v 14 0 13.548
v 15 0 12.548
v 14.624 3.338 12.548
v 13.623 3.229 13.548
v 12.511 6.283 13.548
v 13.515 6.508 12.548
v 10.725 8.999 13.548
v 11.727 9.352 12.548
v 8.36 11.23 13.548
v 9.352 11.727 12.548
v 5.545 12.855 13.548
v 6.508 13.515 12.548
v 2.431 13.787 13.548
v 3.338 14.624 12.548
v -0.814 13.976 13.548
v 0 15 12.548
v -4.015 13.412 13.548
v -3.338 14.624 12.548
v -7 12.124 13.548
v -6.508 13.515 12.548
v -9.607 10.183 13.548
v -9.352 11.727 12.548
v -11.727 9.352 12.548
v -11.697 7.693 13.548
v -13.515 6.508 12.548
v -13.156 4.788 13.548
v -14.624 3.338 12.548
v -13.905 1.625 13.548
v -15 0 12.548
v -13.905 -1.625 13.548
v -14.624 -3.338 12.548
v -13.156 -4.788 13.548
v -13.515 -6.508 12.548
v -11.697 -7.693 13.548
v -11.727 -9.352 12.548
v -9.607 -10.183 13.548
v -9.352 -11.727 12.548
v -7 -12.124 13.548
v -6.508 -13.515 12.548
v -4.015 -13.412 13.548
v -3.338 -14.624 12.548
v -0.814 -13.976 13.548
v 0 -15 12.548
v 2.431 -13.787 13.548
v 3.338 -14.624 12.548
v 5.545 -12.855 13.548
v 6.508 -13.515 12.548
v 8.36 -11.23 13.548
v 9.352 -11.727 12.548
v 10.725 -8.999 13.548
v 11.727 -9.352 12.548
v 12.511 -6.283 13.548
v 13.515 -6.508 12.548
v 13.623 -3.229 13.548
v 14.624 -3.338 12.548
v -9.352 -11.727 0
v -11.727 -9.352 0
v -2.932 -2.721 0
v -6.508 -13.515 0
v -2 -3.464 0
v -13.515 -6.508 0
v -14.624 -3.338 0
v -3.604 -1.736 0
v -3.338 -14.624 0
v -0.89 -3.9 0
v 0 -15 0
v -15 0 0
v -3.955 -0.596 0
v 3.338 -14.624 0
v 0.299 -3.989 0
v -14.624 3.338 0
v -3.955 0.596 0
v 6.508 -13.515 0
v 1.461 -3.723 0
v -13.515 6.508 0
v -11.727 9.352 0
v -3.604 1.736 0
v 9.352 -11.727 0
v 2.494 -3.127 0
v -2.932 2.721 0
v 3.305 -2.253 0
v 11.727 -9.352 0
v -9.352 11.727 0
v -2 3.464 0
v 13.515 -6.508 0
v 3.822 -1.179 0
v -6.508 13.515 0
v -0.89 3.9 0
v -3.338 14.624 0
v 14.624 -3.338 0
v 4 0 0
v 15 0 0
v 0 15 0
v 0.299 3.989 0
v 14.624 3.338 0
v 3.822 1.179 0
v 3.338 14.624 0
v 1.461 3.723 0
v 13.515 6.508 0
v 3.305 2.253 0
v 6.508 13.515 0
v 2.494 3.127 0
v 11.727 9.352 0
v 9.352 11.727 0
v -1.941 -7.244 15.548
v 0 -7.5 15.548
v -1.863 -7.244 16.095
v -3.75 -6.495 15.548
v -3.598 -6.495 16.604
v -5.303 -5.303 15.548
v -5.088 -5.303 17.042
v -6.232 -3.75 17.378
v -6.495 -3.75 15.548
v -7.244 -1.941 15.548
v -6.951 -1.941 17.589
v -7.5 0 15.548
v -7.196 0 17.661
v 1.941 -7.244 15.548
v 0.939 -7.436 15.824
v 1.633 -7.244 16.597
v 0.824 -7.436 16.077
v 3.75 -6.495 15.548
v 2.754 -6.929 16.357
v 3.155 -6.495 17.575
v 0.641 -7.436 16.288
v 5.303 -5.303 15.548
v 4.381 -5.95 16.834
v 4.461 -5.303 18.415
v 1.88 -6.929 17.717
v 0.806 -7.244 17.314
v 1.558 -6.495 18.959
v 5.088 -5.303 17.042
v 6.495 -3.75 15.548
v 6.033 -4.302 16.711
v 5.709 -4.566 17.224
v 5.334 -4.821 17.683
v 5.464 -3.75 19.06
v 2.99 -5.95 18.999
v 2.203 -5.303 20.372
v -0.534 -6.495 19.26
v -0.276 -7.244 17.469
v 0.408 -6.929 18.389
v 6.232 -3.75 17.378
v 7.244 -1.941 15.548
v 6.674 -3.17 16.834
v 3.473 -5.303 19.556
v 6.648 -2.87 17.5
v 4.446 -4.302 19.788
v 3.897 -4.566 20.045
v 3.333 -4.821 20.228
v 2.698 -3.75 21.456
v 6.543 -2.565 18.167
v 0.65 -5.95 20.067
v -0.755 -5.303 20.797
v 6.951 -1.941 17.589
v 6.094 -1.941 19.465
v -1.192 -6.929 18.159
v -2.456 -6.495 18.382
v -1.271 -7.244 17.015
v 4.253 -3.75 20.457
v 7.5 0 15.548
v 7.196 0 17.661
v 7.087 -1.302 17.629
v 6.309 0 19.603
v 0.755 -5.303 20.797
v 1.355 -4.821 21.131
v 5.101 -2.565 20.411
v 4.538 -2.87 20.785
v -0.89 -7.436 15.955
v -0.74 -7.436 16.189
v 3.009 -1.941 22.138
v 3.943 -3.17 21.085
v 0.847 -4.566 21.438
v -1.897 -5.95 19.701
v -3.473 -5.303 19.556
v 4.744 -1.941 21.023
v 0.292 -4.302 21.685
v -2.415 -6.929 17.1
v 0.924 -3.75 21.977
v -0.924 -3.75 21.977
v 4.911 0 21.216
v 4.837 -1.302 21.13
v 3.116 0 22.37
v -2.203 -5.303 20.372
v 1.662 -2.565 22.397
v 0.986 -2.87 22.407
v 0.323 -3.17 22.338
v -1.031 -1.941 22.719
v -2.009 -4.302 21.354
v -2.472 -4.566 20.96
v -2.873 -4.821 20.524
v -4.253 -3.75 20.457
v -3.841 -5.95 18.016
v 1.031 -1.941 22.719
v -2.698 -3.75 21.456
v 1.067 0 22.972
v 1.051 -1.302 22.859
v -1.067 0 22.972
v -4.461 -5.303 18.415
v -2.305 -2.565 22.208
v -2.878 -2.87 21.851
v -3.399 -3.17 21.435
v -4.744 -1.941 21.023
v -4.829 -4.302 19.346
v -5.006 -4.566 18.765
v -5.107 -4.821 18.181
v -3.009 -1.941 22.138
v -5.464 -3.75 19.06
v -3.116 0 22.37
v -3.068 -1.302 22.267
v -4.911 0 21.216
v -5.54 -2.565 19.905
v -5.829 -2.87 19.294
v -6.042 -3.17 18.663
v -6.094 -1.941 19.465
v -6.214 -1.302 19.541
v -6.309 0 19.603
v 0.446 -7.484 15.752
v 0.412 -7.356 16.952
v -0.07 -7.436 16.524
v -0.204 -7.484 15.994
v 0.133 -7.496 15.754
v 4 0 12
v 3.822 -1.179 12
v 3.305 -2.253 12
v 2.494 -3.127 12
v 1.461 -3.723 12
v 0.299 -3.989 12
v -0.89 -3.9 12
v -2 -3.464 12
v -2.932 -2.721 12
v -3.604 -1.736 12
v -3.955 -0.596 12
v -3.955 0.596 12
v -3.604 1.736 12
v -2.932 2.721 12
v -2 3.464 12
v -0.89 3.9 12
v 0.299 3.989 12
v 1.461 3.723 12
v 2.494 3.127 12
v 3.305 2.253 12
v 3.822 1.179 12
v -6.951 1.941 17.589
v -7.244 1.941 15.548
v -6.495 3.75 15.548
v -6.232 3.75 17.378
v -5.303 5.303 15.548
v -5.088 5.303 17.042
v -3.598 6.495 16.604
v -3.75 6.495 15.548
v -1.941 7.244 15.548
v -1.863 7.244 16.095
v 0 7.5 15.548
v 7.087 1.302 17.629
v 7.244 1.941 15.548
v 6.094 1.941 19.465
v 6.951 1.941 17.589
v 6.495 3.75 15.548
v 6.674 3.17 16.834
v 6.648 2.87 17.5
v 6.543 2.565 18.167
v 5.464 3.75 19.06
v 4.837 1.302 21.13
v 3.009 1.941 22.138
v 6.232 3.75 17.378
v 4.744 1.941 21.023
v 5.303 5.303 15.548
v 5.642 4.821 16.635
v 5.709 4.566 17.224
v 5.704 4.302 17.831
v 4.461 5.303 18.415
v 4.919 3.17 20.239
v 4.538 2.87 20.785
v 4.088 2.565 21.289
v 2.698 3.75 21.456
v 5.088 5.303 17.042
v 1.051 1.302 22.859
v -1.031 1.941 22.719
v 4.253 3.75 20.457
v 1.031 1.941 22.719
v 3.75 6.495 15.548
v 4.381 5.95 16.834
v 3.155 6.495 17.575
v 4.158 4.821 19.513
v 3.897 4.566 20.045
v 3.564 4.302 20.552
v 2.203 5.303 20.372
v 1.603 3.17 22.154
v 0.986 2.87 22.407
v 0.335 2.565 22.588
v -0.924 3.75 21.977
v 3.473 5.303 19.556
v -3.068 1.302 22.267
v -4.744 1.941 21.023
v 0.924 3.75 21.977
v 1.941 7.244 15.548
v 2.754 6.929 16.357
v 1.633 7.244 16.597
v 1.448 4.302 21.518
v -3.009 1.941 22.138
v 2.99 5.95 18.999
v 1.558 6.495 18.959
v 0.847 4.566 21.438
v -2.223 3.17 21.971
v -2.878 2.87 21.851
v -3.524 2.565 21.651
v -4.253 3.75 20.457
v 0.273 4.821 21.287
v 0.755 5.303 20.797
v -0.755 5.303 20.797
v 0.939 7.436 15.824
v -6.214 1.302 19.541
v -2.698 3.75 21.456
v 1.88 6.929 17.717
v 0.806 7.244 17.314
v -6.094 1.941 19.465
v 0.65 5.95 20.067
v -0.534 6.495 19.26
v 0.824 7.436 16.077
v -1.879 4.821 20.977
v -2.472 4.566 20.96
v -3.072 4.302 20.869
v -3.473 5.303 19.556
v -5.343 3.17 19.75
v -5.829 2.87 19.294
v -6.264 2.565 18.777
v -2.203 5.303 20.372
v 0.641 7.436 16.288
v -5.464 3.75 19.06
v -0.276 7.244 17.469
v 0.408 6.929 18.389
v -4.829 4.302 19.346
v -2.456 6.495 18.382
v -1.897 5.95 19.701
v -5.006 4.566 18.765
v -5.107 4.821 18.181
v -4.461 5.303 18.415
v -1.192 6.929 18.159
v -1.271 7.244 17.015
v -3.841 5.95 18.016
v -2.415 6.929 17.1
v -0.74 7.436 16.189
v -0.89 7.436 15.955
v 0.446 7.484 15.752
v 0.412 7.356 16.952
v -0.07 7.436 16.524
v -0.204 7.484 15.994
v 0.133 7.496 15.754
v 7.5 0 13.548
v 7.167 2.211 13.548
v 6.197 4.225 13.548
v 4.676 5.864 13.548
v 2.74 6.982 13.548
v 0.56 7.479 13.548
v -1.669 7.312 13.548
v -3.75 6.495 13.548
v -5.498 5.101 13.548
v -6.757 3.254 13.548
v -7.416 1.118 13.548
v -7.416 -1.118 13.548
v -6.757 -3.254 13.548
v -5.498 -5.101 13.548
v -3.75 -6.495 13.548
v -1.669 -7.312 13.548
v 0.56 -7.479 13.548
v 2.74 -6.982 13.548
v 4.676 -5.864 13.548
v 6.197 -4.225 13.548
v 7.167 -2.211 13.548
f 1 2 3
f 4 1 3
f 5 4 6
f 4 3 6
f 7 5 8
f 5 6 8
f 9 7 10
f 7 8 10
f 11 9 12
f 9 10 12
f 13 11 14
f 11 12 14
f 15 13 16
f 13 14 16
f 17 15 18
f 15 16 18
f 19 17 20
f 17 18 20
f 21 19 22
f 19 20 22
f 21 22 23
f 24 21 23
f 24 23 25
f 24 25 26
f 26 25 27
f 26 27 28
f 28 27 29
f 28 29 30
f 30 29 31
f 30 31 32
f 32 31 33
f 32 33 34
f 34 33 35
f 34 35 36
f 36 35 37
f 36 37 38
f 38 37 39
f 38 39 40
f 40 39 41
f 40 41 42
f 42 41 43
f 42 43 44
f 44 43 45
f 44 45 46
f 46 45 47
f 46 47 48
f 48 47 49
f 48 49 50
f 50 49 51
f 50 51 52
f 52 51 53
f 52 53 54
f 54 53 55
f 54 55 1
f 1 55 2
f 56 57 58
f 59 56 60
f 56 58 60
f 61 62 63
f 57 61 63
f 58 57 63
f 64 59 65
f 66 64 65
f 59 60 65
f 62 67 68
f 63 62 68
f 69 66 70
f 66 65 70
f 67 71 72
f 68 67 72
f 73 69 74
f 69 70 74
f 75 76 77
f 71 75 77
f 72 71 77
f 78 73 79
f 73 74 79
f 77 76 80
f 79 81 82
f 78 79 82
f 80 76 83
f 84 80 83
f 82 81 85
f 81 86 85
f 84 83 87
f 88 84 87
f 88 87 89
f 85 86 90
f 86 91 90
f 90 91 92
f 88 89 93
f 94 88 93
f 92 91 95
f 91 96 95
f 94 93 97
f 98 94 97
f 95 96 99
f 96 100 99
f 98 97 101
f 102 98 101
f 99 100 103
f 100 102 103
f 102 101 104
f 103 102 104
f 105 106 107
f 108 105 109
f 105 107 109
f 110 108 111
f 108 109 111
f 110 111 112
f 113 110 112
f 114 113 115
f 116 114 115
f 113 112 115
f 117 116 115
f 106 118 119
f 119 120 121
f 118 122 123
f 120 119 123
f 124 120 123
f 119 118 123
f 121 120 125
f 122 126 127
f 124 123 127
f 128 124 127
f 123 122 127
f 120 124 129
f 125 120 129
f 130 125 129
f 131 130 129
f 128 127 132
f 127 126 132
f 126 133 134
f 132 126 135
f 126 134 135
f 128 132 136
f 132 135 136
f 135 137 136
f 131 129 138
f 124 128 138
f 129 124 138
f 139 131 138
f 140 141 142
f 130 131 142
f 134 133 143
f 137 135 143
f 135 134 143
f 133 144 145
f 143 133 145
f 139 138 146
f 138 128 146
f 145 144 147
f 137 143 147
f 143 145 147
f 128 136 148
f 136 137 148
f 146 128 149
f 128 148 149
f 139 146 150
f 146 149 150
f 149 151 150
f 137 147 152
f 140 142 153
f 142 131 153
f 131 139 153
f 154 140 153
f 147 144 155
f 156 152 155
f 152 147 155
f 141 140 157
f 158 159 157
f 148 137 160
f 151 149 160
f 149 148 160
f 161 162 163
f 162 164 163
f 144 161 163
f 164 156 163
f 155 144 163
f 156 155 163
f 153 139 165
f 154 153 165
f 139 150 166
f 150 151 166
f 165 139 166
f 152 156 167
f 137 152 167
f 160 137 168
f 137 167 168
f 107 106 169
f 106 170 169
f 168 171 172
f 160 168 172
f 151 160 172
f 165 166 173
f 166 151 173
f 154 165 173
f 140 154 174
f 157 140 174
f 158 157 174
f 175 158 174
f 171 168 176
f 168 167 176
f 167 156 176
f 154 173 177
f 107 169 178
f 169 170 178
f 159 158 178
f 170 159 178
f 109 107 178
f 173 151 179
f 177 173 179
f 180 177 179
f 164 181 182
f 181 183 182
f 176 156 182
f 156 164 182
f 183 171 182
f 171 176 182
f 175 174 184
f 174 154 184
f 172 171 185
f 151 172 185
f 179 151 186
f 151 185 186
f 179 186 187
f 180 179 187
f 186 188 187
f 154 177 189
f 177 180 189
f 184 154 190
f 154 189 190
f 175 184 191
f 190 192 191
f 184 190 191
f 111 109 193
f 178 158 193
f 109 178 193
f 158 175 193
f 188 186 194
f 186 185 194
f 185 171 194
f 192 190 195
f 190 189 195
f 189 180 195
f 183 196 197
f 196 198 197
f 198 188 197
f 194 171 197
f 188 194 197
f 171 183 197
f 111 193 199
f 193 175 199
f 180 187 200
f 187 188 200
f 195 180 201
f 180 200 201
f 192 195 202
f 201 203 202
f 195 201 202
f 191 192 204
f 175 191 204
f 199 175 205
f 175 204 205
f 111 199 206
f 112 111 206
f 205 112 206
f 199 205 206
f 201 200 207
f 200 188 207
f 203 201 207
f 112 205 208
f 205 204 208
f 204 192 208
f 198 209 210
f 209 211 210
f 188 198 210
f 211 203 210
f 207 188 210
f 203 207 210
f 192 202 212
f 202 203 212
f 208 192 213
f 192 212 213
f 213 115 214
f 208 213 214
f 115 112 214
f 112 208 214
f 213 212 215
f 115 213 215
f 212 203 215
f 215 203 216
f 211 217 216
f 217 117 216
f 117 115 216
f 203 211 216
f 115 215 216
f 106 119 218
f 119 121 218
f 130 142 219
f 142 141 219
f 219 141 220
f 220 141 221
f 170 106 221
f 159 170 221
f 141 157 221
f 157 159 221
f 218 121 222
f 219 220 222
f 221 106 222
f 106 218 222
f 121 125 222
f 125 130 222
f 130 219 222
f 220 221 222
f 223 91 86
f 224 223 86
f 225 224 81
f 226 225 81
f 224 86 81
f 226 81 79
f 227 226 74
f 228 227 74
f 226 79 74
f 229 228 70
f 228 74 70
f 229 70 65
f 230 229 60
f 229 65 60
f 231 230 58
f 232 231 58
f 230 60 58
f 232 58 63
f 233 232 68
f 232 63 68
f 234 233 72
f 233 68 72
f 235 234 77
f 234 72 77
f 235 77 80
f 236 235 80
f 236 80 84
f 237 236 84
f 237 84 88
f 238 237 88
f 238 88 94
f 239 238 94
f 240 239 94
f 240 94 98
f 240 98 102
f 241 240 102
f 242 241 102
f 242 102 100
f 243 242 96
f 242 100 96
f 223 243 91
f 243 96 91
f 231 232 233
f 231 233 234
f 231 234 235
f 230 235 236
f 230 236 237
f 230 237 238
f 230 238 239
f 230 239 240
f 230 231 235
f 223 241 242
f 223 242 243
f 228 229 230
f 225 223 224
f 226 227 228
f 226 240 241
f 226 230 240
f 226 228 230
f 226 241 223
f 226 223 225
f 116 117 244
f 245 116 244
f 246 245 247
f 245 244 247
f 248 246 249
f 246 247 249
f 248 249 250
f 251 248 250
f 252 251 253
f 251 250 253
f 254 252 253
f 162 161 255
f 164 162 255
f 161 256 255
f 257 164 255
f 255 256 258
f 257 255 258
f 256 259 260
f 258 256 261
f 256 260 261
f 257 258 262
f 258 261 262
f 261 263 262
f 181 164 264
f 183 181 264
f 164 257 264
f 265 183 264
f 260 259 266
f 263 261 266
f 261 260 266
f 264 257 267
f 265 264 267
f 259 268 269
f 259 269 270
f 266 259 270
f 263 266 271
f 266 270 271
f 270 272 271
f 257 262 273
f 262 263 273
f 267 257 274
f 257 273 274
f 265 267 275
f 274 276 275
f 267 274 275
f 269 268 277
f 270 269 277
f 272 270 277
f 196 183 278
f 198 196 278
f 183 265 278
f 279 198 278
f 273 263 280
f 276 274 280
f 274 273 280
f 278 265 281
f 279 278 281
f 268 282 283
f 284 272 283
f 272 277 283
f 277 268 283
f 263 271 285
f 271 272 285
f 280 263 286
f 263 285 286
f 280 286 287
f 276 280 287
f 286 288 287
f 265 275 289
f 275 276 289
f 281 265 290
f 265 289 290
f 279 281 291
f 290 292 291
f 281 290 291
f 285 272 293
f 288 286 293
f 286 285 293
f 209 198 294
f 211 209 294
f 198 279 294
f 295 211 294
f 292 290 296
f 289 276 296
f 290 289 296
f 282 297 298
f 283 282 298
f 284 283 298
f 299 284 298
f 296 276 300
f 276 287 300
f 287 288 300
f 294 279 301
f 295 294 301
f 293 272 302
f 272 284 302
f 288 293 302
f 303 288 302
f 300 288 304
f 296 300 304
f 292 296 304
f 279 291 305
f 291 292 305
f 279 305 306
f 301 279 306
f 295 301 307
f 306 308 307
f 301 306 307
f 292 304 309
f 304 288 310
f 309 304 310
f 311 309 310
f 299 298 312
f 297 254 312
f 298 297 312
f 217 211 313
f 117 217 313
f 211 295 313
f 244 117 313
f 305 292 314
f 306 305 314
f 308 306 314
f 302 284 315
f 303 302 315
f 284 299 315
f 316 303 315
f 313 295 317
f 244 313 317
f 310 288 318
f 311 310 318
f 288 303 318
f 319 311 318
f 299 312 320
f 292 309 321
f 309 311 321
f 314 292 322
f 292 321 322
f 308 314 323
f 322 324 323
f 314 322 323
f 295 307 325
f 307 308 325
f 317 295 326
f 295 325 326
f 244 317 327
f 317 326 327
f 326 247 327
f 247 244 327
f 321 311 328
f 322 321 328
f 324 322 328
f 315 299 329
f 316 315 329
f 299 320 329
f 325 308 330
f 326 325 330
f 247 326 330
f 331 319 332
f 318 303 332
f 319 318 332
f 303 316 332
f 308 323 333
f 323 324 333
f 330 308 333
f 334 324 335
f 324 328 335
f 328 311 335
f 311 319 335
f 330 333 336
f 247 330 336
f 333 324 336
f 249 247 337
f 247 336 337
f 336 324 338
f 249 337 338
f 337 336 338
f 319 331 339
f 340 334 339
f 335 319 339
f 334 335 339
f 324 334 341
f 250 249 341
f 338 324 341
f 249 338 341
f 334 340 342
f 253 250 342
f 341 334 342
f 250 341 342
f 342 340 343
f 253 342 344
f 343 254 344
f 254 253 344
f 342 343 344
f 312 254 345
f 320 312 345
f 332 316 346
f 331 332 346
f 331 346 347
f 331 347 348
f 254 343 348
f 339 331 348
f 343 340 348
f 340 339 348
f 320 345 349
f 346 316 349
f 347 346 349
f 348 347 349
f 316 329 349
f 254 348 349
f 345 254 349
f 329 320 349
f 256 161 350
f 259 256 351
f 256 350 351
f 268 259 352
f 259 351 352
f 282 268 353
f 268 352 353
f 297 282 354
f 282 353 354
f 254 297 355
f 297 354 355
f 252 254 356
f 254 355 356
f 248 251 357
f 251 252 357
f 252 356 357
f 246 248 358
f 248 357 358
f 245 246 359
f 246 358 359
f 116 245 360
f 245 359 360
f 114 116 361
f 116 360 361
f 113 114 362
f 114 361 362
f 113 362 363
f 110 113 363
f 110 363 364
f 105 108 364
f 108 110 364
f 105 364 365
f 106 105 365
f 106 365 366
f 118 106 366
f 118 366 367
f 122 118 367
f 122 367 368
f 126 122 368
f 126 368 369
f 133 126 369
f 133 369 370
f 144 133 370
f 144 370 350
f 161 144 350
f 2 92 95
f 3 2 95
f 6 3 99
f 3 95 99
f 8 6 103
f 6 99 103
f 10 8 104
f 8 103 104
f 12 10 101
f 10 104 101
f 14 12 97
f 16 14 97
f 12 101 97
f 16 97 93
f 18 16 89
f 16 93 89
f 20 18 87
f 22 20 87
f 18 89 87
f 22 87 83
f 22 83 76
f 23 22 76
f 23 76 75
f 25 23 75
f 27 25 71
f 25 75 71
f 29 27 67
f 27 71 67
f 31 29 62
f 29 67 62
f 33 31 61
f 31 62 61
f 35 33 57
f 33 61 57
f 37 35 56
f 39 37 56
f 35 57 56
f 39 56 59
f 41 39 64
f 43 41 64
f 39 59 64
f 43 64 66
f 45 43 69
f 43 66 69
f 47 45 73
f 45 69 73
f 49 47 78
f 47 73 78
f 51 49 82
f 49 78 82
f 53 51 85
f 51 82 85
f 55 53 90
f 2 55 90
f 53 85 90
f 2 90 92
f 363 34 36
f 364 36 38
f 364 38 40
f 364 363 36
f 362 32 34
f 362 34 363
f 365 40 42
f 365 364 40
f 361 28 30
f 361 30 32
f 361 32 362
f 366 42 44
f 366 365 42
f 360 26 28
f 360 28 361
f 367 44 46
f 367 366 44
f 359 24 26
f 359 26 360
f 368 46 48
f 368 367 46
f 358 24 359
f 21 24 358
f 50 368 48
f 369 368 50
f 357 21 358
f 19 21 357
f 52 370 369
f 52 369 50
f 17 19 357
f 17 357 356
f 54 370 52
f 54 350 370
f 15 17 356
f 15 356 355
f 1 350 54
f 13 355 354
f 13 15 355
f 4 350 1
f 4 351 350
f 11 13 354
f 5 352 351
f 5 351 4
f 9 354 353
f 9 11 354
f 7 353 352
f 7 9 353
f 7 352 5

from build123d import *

# Parameters (mm, degrees)
F0_R     = 15
F1_DEPTH = 13.548
F2_R     = 7.5
F3_DEPTH = 2
F5_ANGLE = -180
F6_R     = 4
F7_DEPTH = 12
F8_SIZE  = 1


with BuildPart() as f1:
    # F0 (on Top) → F1 (new body)
    with BuildSketch(Plane.XY):
        Circle(F0_R)
    extrude(amount=F1_DEPTH)

    # F2 (on face) → F3 (join)
    with BuildSketch(Plane.XY.offset(13.548)):
        Circle(F2_R)
    extrude(amount=F3_DEPTH)

    # F4 (on face) → F5 (revolve)
    with BuildSketch(Plane.XY.offset(15.548)):
        with BuildLine():
            Line((0, 7.5), (0, -7.5))
            ThreePointArc((0, -7.5), (5.303301, -5.303301), (7.5, 0))
            ThreePointArc((7.5, 0), (5.303301, 5.303301), (0, 7.5))
        make_face()
    revolve(axis=Axis((0, 0, 15.548), (0, 1, 0)), revolution_arc=F5_ANGLE)

    # F6 (on face) → F7 (cut)
    with BuildSketch(Plane(origin=(0, 0, 0), x_dir=(1, 0, 0), z_dir=(0, 0, -1))):
        Circle(F6_R)
    extrude(amount=-F7_DEPTH, mode=Mode.SUBTRACT)

    # F8
    f8_edges = [f1.edges().sort_by_distance(p)[0] for p in [
        (-15, 0, 13.548),
    ]]
    chamfer(f8_edges, length=F8_SIZE)


solid = f1.part
